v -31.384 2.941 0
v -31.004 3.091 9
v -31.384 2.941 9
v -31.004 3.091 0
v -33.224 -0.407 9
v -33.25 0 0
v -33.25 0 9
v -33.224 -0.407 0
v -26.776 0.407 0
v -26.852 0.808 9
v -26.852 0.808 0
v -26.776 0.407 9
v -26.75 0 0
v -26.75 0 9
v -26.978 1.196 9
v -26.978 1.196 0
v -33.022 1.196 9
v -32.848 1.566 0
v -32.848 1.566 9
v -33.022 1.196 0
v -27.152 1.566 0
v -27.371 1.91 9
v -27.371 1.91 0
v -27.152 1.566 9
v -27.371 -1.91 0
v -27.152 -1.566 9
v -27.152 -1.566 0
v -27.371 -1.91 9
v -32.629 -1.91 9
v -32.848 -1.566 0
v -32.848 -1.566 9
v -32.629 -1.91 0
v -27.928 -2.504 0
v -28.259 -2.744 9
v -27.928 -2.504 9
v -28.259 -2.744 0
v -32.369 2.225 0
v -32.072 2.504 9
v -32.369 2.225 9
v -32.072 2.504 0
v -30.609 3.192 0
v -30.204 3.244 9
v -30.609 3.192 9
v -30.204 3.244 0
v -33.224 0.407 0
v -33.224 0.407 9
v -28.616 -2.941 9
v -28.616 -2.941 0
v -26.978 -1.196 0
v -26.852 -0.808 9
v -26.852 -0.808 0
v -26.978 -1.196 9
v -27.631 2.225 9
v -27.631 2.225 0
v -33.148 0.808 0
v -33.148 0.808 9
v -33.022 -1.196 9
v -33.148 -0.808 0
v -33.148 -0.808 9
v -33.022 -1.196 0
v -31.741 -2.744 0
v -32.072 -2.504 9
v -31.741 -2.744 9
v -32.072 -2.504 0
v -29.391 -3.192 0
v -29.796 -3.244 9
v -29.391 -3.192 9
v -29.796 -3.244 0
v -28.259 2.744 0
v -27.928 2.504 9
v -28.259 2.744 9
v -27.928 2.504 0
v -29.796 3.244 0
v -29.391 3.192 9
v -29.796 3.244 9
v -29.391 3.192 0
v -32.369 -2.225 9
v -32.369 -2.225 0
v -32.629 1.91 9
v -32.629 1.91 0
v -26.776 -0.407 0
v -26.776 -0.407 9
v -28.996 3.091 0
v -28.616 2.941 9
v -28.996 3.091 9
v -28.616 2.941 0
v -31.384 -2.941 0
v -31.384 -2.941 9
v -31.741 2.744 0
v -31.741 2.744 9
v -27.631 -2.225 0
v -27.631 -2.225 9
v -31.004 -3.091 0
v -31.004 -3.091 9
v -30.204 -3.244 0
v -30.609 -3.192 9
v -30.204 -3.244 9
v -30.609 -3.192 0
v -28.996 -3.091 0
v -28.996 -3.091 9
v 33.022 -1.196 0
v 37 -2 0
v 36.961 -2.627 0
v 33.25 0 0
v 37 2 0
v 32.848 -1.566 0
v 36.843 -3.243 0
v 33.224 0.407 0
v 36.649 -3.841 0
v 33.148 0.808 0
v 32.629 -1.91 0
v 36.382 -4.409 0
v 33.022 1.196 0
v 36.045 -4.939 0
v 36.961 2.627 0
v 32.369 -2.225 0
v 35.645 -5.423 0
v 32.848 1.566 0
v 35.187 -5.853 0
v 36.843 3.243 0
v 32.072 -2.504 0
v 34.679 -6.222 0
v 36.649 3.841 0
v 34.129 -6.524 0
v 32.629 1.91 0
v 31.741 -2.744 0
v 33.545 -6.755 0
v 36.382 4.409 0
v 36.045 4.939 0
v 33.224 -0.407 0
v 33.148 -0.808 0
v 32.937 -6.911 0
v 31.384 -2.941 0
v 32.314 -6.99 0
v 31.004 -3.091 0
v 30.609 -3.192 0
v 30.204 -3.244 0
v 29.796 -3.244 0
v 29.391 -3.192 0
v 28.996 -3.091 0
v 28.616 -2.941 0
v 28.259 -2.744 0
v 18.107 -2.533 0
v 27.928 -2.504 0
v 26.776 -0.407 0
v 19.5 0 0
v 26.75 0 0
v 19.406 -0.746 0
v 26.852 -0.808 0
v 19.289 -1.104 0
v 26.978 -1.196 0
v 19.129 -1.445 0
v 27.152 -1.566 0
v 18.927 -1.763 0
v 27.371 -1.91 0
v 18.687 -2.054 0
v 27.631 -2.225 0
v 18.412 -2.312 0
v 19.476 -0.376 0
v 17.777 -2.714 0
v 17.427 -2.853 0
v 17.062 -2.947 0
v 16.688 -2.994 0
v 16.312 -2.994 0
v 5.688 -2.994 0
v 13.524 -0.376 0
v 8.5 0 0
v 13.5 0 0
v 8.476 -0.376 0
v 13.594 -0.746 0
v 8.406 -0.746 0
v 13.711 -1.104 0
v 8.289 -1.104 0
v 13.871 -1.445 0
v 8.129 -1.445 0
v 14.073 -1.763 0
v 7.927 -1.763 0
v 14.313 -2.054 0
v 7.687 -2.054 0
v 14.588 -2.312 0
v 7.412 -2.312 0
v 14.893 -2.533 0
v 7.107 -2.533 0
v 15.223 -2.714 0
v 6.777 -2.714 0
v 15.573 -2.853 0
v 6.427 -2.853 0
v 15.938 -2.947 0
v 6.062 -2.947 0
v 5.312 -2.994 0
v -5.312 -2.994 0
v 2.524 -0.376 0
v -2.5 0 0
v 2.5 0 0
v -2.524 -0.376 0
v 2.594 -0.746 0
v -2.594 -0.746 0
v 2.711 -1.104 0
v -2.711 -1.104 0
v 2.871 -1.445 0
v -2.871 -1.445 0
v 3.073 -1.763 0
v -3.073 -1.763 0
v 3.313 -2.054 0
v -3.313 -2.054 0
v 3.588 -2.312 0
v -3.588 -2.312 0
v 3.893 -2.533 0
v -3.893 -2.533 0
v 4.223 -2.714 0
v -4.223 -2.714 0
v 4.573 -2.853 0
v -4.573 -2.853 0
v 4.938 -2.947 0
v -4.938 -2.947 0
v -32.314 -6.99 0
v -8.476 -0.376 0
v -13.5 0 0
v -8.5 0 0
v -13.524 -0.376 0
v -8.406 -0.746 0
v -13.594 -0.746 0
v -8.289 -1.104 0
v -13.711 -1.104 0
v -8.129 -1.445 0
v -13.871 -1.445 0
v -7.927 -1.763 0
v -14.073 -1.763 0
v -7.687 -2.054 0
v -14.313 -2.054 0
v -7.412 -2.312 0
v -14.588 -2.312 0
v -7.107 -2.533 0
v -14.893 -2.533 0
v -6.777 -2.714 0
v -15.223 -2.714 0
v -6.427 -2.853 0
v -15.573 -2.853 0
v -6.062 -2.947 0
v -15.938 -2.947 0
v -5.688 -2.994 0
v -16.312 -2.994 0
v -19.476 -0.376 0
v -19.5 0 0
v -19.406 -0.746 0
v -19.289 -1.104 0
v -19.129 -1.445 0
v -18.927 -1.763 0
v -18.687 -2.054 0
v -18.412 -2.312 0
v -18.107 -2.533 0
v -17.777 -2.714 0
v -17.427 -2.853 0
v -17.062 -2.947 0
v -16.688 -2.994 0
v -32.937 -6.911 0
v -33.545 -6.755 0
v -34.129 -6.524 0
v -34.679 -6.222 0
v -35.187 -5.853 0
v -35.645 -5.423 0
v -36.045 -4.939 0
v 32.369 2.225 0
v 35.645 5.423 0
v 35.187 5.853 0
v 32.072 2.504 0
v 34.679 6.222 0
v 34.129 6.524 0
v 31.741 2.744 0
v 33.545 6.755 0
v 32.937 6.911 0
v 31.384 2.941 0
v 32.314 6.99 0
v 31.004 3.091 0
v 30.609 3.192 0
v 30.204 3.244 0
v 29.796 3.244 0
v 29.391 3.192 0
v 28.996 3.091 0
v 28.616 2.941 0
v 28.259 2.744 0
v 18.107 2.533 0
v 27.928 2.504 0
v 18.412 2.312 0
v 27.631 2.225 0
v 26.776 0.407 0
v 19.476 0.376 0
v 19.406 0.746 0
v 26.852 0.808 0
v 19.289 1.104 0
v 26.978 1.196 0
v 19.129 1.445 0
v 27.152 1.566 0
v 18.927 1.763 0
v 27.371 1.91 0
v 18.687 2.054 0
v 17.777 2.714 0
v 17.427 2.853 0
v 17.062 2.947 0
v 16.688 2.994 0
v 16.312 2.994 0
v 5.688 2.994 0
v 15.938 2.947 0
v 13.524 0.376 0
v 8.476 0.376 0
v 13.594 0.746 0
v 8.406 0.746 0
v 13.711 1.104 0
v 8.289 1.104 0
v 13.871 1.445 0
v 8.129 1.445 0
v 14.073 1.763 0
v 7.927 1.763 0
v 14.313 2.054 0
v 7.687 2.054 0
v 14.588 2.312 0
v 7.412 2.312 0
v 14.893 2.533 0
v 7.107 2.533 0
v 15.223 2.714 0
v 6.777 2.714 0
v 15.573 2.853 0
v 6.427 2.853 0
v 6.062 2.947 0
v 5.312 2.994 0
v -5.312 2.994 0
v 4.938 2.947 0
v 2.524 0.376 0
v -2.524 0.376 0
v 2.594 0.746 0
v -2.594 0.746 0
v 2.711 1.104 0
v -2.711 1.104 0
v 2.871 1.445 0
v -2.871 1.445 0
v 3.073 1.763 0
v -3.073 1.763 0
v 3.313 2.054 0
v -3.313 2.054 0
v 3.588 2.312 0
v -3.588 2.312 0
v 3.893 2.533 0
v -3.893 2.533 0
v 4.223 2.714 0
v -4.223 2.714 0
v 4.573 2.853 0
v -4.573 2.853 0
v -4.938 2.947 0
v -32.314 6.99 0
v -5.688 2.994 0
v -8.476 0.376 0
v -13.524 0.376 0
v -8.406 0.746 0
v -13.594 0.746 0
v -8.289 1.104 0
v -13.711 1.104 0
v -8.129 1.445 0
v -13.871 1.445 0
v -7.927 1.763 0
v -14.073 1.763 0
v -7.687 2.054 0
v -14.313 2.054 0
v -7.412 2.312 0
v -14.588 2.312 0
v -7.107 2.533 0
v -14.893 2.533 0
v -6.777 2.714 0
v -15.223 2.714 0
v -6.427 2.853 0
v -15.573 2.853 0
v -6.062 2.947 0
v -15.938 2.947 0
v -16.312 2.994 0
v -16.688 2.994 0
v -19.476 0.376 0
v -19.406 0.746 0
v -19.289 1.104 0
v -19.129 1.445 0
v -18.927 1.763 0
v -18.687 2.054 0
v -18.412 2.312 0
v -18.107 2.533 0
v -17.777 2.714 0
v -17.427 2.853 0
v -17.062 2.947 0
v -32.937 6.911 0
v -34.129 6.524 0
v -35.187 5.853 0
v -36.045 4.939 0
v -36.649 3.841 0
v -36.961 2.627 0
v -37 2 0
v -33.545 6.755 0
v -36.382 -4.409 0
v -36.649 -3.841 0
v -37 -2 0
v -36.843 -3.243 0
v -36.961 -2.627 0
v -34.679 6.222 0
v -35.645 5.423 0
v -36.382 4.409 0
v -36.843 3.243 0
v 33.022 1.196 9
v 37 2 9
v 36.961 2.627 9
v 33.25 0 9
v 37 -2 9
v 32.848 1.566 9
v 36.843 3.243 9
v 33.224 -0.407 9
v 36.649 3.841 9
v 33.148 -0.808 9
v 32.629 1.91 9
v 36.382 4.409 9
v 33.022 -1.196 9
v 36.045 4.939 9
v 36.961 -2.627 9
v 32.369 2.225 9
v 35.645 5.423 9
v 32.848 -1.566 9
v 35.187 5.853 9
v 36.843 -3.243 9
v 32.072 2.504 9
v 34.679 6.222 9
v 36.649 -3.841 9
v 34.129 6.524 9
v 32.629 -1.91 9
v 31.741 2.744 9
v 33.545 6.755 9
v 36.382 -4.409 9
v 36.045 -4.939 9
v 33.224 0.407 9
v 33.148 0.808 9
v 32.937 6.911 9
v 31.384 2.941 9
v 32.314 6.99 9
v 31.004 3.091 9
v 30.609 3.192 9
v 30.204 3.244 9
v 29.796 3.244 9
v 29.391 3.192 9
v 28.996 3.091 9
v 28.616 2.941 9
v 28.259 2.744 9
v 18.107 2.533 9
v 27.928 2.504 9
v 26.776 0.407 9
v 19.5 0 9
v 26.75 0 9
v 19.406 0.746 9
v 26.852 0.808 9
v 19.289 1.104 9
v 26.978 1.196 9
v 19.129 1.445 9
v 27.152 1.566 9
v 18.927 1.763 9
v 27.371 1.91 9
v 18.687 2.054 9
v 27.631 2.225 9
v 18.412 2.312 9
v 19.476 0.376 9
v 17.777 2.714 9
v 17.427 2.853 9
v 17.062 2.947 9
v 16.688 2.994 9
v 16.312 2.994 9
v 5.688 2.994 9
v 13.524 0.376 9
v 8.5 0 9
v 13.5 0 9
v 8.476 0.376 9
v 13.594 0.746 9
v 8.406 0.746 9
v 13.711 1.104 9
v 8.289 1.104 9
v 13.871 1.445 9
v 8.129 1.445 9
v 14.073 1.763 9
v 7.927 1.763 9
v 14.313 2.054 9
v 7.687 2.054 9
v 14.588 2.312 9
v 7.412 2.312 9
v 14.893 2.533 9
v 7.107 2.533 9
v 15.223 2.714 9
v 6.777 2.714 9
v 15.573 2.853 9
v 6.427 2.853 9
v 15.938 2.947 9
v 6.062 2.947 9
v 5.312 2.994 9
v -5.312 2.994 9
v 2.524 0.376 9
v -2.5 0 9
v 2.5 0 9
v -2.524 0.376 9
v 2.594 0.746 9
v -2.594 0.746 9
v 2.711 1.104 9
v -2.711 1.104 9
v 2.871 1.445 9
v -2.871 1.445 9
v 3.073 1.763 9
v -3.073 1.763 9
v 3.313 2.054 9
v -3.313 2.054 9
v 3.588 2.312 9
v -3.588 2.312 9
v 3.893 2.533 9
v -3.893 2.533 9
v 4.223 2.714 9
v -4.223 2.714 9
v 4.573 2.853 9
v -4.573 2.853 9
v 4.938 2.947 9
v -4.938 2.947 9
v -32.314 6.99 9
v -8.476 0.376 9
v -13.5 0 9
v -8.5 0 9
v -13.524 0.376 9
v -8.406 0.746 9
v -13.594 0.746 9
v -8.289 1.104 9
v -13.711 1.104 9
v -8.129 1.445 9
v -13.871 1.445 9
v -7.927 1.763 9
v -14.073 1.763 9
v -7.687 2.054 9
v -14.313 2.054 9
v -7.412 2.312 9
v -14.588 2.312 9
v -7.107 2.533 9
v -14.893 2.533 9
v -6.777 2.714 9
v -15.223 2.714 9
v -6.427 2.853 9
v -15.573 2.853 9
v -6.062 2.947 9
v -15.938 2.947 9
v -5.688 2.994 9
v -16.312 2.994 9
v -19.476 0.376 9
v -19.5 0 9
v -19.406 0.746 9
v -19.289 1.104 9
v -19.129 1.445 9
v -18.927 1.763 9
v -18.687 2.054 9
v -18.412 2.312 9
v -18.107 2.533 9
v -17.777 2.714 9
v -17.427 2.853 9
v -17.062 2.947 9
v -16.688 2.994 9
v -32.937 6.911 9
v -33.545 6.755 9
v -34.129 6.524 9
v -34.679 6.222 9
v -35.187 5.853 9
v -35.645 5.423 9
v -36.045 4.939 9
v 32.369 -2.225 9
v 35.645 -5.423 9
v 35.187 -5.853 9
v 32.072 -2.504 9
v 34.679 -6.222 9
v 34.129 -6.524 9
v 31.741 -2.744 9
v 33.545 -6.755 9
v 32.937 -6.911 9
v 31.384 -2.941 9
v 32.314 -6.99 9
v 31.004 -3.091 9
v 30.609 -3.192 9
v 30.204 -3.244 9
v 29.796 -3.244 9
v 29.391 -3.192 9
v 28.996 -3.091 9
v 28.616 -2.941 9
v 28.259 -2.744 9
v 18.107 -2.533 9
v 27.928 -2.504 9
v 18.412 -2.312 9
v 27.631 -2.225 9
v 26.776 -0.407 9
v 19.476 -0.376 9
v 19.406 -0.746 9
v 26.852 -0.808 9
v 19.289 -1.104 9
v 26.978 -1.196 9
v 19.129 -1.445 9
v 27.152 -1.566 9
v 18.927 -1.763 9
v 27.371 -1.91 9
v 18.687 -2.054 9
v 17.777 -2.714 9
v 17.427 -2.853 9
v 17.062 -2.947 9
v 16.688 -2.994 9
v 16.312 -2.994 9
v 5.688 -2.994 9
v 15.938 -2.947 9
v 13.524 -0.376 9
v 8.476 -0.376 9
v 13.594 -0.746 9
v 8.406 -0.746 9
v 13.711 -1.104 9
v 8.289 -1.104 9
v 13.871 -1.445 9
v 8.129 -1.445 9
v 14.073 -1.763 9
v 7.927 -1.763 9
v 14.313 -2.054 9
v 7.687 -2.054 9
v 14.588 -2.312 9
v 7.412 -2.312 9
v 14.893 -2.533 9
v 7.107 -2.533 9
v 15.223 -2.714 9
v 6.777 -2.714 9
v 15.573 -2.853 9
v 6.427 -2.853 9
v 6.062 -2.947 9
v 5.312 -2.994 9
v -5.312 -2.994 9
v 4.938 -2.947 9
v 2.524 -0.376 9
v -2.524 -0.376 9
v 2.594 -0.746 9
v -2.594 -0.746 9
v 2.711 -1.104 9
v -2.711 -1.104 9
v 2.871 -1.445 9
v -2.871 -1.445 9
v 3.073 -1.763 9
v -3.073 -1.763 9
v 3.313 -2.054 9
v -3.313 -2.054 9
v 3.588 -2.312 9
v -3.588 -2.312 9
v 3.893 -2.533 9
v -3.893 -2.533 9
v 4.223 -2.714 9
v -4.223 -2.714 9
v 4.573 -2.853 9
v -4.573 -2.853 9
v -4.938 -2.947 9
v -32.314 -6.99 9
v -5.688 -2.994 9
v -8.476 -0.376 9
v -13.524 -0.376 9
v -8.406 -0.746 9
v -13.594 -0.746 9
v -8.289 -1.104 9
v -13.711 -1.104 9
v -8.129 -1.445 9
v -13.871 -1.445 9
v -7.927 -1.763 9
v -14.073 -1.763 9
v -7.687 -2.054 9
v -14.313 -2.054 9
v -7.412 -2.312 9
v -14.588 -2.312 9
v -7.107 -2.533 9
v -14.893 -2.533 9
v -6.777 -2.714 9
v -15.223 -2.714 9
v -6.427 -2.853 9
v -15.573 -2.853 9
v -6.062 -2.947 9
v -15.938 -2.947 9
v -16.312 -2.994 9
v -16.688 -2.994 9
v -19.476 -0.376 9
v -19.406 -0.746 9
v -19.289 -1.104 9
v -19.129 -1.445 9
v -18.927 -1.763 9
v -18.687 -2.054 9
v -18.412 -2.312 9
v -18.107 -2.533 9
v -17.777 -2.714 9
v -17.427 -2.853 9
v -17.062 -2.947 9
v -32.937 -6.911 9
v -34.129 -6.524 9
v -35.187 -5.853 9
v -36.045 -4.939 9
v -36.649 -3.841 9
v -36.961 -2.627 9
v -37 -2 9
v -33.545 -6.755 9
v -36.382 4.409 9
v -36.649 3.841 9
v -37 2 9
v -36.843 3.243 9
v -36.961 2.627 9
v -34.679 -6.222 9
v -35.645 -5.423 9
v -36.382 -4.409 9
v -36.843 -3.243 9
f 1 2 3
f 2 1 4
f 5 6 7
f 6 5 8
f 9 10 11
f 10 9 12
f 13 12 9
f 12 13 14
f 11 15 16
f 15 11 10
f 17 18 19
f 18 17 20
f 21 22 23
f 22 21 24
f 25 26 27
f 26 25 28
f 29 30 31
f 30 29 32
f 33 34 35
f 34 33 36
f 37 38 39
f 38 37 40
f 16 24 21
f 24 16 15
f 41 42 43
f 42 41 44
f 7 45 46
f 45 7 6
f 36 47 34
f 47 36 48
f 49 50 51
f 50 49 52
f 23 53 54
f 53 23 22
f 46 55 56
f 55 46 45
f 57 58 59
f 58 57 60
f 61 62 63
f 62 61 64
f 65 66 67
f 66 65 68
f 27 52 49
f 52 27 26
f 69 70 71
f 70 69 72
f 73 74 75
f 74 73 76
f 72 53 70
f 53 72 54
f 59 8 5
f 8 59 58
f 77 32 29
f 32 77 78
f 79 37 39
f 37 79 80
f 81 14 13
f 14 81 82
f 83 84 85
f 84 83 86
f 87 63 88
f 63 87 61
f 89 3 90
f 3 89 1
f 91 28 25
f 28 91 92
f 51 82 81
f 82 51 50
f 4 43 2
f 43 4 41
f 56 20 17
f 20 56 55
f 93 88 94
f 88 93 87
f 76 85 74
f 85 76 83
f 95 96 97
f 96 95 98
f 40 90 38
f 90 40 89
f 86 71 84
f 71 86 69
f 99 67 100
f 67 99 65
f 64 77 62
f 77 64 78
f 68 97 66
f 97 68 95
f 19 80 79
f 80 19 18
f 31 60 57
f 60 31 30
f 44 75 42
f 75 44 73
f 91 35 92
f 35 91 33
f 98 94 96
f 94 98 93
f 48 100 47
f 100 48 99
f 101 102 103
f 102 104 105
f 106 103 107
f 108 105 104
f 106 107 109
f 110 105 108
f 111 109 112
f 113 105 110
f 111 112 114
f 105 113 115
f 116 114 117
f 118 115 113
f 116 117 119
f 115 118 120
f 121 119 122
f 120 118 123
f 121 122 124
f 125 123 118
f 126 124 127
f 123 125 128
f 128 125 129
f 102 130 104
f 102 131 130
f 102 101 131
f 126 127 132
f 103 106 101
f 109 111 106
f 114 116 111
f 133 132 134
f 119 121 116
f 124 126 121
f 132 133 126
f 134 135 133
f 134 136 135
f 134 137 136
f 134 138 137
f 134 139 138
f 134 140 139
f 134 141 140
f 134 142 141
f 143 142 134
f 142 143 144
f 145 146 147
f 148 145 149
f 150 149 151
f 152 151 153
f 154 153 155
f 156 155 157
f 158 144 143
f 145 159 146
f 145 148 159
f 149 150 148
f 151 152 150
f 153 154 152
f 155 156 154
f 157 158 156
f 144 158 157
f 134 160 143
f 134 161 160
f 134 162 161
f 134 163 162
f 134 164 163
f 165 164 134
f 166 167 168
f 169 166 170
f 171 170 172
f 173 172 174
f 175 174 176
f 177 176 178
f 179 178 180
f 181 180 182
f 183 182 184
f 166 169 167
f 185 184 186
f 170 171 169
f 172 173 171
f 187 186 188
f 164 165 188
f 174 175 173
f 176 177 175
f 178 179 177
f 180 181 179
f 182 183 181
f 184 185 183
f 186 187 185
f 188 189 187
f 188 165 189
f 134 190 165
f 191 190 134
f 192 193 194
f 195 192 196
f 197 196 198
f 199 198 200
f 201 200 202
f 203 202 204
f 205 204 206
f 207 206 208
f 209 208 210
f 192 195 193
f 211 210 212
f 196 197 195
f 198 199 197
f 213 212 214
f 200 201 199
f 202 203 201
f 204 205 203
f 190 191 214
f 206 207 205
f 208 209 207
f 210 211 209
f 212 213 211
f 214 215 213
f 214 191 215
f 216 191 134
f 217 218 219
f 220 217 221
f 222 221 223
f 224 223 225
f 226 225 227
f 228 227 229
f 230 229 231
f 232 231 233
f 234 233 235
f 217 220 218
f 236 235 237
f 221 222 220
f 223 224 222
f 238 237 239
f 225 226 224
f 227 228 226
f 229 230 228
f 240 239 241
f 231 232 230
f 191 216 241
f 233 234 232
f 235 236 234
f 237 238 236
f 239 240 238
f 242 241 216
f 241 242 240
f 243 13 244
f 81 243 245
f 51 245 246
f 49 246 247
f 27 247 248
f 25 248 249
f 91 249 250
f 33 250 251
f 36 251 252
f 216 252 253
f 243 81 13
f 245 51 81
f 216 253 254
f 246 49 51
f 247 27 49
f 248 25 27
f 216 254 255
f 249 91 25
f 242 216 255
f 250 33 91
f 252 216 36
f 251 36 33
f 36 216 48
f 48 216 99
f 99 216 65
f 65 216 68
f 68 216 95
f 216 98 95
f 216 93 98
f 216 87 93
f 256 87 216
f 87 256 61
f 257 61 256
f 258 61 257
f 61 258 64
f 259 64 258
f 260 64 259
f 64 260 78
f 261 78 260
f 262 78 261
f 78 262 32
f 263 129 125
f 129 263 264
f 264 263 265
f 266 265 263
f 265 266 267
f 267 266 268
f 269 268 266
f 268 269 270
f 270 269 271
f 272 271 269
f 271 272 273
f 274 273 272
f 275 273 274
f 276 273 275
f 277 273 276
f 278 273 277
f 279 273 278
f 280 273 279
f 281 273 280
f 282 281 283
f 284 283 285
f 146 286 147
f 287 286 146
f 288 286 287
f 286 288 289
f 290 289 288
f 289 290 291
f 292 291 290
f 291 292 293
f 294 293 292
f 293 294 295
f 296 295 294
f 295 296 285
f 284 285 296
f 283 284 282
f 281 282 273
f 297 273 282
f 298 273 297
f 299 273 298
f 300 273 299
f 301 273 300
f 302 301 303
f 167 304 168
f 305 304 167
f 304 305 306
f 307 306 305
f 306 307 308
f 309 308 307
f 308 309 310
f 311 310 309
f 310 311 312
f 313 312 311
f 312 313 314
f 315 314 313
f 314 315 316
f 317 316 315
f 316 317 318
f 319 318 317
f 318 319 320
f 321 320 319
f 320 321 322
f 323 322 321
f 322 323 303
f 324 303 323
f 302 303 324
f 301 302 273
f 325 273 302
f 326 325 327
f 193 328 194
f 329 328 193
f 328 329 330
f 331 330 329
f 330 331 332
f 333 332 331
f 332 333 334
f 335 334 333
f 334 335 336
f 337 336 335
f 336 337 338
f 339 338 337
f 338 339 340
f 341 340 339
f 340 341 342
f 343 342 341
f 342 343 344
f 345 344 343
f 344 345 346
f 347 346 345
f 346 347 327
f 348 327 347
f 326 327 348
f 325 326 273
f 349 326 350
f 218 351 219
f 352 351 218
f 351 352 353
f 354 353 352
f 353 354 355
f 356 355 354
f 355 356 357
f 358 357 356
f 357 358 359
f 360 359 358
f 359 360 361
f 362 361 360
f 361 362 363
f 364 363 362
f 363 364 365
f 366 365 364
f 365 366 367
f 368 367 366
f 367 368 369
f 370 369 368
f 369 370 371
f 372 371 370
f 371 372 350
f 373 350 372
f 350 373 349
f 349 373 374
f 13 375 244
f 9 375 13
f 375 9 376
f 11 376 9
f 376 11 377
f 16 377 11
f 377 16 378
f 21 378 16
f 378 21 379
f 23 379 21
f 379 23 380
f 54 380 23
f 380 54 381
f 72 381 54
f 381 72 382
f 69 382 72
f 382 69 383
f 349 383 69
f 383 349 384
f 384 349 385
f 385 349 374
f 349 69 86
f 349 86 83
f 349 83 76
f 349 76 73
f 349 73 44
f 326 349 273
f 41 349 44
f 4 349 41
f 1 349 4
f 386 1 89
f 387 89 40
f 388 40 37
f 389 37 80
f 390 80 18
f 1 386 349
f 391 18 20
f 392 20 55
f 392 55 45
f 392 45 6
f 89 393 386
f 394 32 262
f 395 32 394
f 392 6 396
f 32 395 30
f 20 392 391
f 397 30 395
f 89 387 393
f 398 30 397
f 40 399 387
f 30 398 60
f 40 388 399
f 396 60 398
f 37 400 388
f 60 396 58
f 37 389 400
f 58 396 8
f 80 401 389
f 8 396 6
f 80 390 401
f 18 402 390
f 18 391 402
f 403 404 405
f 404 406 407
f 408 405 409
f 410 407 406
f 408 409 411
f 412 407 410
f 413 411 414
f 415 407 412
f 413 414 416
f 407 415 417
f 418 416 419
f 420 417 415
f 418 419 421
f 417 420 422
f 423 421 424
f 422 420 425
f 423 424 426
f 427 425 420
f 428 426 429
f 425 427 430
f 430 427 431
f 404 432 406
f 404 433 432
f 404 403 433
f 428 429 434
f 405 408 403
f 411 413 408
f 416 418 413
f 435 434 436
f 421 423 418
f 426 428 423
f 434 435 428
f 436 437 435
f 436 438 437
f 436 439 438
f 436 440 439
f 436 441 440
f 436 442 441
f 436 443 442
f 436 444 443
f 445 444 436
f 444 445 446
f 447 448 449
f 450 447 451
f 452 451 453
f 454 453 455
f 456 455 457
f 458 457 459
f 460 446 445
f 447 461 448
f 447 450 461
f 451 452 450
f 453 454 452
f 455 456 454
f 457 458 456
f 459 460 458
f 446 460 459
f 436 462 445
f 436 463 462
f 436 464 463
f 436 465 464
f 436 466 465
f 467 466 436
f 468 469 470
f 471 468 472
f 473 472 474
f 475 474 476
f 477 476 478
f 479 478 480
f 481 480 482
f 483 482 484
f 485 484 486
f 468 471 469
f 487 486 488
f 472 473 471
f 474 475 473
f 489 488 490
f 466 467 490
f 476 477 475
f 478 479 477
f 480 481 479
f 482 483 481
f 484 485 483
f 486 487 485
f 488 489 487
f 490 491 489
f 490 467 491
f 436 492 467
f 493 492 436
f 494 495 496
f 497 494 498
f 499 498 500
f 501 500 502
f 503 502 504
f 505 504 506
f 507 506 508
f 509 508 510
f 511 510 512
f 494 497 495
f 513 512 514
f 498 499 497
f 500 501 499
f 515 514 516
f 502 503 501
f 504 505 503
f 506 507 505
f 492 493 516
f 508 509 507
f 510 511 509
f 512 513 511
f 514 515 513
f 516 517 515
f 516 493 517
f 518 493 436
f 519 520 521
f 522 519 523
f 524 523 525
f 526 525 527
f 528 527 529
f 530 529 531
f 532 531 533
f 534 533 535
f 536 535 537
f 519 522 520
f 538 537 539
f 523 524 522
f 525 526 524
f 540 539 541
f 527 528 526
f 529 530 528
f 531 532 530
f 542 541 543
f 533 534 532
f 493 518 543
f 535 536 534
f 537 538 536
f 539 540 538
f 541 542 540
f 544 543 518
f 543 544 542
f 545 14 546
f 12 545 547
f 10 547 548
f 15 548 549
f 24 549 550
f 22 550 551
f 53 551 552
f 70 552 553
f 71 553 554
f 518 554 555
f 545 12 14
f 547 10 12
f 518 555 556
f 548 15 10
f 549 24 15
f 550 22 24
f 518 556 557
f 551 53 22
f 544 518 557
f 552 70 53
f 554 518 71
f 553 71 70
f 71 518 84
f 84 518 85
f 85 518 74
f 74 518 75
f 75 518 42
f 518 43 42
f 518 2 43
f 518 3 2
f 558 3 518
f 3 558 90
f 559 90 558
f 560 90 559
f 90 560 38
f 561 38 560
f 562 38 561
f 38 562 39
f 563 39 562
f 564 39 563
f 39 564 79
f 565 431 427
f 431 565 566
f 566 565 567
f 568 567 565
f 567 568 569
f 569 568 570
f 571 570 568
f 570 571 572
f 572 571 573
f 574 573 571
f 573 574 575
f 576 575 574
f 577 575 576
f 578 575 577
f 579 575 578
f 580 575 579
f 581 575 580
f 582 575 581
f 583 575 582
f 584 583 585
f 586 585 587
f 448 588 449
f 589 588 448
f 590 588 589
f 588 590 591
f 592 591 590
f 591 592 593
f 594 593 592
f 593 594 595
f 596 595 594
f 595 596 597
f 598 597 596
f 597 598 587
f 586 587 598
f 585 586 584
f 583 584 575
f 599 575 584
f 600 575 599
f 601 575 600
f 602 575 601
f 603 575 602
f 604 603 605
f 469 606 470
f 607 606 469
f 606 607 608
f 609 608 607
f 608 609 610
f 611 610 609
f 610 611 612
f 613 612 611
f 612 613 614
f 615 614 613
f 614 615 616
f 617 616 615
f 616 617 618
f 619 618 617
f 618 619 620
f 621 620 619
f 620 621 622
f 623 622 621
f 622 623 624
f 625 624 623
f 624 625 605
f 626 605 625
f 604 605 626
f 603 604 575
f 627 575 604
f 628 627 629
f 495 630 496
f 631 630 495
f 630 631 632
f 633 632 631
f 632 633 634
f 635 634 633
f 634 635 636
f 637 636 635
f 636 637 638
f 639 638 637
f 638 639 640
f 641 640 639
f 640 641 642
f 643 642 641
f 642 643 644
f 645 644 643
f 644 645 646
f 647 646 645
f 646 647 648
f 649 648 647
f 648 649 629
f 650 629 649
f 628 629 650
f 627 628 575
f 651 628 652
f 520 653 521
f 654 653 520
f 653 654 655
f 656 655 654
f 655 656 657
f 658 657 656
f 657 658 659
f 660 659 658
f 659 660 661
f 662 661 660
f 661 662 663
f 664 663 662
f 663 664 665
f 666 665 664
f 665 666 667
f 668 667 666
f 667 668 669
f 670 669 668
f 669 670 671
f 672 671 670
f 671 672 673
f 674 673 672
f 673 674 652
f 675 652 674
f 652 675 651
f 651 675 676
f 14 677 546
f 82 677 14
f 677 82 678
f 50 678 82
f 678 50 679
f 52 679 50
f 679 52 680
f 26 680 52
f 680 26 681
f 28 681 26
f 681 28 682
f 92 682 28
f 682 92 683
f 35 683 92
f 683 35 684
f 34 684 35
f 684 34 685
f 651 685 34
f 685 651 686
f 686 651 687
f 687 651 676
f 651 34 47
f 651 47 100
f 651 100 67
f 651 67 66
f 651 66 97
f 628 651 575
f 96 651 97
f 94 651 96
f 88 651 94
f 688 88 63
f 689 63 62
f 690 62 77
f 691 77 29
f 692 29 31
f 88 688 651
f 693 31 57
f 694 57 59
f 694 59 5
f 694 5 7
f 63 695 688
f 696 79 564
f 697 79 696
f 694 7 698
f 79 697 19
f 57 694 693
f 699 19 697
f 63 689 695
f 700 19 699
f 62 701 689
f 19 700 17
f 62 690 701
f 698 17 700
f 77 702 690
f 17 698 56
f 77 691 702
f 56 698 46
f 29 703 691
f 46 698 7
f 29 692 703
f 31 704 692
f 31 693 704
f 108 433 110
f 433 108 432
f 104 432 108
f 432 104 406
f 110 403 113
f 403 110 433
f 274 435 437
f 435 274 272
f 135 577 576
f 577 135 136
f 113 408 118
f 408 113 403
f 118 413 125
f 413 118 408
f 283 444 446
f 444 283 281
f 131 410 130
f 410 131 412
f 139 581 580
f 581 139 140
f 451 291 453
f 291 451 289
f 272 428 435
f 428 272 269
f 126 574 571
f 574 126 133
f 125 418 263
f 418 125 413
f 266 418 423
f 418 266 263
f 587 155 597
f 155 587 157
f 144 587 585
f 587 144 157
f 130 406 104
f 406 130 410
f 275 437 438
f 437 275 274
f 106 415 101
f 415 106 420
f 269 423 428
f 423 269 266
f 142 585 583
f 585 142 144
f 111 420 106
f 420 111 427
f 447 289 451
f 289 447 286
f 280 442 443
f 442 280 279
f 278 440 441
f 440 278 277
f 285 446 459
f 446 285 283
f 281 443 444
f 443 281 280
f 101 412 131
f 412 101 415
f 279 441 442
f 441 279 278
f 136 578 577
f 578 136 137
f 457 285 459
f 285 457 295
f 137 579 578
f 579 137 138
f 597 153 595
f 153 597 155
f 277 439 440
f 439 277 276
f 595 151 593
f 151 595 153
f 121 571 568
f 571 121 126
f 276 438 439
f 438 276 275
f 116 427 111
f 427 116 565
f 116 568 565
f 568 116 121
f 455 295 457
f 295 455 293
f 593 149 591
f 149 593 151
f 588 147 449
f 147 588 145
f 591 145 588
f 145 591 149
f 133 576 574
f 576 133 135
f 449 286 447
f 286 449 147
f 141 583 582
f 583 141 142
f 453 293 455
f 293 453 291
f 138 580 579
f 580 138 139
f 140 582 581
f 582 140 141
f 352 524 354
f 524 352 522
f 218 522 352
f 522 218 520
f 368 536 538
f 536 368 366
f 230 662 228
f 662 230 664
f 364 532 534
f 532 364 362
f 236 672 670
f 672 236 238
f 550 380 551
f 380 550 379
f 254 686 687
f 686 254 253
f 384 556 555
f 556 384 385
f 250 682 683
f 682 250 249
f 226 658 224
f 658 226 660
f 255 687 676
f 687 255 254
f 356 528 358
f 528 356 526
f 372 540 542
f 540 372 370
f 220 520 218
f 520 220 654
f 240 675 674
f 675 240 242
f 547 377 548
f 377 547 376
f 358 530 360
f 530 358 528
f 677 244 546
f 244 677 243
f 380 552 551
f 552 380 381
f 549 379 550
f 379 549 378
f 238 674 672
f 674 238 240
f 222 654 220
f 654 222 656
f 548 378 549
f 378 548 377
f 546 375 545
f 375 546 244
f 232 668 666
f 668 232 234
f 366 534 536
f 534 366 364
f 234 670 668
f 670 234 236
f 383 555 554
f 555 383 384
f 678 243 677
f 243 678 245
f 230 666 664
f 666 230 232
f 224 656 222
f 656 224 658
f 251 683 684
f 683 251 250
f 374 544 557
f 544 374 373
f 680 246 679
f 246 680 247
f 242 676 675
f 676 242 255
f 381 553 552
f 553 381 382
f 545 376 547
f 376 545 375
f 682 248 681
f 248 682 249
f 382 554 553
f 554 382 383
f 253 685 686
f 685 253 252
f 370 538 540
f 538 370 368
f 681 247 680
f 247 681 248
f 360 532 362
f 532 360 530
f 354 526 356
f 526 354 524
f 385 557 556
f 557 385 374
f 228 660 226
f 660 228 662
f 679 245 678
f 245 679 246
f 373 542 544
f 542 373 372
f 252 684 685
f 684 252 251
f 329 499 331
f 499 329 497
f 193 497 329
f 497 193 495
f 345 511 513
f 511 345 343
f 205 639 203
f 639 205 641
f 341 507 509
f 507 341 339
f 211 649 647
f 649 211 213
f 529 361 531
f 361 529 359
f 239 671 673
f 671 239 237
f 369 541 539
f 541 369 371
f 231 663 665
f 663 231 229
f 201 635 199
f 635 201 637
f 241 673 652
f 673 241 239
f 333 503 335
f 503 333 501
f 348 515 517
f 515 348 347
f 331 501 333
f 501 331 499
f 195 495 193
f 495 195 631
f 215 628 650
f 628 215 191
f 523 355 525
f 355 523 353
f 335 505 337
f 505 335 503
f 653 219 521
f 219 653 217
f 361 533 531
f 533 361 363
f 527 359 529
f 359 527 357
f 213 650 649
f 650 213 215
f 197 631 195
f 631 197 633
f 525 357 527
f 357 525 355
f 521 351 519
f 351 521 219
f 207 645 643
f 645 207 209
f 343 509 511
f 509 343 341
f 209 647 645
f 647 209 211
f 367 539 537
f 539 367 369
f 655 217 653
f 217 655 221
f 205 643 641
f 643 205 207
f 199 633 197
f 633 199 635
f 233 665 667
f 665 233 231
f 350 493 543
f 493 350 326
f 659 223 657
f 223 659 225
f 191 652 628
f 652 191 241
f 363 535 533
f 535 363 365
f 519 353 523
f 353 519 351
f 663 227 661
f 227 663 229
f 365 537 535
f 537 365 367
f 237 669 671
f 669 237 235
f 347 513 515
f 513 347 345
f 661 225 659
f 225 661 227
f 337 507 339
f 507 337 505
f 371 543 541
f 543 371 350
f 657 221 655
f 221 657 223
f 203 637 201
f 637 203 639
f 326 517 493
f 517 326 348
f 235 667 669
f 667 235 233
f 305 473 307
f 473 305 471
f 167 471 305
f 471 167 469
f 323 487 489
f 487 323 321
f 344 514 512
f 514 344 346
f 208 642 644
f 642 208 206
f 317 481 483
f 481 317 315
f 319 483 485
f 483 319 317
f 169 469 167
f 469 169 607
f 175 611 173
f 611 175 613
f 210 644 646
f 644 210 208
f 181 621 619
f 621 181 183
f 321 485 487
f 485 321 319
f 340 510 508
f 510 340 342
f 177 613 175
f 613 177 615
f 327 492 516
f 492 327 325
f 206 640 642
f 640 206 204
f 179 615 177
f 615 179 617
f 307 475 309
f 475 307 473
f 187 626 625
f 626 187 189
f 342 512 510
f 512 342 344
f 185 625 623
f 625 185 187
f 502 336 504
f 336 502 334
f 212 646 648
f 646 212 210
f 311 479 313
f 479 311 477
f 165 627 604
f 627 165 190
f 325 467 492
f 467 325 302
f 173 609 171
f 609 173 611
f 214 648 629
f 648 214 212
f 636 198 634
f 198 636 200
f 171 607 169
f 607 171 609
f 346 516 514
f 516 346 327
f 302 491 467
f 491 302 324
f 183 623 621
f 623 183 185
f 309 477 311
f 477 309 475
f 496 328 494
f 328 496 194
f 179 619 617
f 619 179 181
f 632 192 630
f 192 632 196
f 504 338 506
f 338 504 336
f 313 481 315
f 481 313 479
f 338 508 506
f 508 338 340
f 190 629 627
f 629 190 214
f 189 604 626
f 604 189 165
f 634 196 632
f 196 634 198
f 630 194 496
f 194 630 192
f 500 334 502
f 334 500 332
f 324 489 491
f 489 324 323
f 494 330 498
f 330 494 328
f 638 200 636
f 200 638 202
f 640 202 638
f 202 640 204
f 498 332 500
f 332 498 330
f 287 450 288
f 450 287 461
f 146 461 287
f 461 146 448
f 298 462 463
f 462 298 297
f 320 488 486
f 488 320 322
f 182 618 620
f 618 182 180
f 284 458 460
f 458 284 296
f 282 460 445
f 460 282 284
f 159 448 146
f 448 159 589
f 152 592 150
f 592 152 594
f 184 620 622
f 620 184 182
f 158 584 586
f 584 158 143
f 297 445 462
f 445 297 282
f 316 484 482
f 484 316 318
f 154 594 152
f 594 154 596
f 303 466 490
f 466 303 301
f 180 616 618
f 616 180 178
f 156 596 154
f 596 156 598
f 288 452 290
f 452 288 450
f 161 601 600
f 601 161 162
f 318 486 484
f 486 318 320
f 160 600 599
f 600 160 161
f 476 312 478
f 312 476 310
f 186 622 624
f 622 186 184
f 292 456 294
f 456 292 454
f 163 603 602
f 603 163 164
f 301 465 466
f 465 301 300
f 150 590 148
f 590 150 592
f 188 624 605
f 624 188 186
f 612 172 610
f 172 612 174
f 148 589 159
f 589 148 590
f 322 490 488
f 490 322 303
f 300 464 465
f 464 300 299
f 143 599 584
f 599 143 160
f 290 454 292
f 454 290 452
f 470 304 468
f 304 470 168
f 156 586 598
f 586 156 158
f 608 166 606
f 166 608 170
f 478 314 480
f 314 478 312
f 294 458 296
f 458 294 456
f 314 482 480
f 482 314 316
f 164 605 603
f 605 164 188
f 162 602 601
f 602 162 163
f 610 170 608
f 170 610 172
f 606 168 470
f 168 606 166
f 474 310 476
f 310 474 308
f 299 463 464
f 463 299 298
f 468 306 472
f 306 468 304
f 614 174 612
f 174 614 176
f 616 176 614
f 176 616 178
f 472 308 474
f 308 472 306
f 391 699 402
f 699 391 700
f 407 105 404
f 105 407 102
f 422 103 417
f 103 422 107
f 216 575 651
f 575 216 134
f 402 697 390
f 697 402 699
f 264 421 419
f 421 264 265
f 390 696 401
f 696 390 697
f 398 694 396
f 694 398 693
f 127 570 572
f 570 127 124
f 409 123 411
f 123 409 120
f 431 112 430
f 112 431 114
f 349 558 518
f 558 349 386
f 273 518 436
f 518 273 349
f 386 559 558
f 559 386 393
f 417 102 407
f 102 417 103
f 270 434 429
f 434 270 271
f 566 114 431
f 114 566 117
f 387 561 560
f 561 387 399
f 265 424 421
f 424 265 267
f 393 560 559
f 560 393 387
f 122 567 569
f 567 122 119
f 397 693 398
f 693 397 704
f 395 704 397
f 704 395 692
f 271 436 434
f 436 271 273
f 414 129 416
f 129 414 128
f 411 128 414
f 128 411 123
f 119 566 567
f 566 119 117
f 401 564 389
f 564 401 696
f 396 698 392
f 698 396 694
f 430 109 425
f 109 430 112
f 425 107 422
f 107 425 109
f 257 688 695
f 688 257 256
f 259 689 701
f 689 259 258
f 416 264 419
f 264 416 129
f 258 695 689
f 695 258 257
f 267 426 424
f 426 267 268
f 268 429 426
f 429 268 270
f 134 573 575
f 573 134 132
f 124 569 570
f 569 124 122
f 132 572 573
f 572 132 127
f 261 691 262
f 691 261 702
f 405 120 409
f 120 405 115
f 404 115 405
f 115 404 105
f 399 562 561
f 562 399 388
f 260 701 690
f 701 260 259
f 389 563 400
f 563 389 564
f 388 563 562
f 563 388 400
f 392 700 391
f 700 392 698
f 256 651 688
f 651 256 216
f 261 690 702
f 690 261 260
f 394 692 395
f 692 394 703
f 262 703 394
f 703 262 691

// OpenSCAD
$fn = 50;

difference() {
	union() {
		hull() {
			translate(v = [-32.0, 2.0, 0]) {
				cylinder(h = 9, r = 5);
			}
			translate(v = [32.0, 2.0, 0]) {
				cylinder(h = 9, r = 5);
			}
			translate(v = [-32.0, -2.0, 0]) {
				cylinder(h = 9, r = 5);
			}
			translate(v = [32.0, -2.0, 0]) {
				cylinder(h = 9, r = 5);
			}
		}
	}
	union() {
		translate(v = [-30.0, 0.0, 0]) {
			cylinder(h = 9, r = 3.25);
		}
		translate(v = [30.0, 0.0, 0]) {
			cylinder(h = 9, r = 3.25);
		}
		translate(v = [-16.5, 0, 0.0]) {
			cylinder(h = 9, r = 3.0);
		}
		translate(v = [-5.5, 0, 0.0]) {
			cylinder(h = 9, r = 3.0);
		}
		translate(v = [5.5, 0, 0.0]) {
			cylinder(h = 9, r = 3.0);
		}
		translate(v = [16.5, 0, 0.0]) {
			cylinder(h = 9, r = 3.0);
		}
	}
}
